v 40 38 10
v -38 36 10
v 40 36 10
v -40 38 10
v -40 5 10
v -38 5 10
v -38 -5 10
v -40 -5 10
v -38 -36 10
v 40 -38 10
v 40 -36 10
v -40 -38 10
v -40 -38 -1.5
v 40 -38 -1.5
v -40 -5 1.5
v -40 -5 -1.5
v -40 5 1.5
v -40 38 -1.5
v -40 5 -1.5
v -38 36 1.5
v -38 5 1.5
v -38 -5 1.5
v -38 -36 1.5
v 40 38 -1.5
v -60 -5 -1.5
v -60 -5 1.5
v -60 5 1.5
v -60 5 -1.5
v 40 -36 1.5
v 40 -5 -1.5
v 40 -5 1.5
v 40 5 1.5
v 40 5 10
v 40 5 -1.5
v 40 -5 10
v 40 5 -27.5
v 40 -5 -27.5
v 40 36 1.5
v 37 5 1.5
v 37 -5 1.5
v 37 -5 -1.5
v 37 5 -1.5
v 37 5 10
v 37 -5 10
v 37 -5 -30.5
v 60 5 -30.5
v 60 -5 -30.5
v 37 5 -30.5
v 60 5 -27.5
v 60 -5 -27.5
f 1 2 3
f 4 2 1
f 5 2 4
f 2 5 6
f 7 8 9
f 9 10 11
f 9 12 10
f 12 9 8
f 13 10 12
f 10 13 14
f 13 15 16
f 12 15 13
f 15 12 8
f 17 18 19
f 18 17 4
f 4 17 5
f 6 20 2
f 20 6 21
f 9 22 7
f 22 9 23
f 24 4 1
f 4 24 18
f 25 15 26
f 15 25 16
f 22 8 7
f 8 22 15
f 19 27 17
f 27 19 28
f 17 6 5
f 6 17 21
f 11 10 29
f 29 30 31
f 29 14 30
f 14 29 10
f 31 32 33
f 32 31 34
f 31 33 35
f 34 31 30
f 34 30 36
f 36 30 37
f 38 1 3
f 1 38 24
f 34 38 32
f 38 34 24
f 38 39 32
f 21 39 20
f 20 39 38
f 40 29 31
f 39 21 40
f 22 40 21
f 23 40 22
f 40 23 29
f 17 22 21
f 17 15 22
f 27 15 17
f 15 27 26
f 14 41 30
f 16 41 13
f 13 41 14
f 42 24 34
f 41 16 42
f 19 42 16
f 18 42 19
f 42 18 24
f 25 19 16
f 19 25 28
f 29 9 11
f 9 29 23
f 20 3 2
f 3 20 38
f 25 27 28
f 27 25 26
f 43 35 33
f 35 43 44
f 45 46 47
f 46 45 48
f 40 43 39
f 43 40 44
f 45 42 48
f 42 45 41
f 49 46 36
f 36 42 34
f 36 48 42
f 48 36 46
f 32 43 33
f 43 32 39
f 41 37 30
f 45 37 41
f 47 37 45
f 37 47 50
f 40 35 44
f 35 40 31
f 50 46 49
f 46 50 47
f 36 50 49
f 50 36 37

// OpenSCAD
module example002()
{
	//intersection() {
		//difference() {
			
			union() {
				cube([80, 76, 3], center = true);
		
translate([0,-37,5])		
cube([80, 2, 10], center = true);
		translate([0,37,5])		
cube([80, 2, 10], center = true);

translate([-20,0,0])
cube([80, 10, 3], center = true);


translate([38.5,0,-10.25])
cube([3, 10, 40.5], center = true);
translate([50,0,-29])
cube([20,10,3],center=true);

difference(){
rotate([0,0,90])
translate([0,39,5])	
cube([76, 2, 10], center = true);

rotate([0,0,90])
translate([0,39,2.5])
cube([10,4,16],center=true);

}
		



		//cube([10, 10, 50], center = true);

			}
		//}
		//translate([0, 0, 5])
		//	cylinder(h = 50, r1 = 20, r2 = 5, center = true);
	//}
}

example002();
